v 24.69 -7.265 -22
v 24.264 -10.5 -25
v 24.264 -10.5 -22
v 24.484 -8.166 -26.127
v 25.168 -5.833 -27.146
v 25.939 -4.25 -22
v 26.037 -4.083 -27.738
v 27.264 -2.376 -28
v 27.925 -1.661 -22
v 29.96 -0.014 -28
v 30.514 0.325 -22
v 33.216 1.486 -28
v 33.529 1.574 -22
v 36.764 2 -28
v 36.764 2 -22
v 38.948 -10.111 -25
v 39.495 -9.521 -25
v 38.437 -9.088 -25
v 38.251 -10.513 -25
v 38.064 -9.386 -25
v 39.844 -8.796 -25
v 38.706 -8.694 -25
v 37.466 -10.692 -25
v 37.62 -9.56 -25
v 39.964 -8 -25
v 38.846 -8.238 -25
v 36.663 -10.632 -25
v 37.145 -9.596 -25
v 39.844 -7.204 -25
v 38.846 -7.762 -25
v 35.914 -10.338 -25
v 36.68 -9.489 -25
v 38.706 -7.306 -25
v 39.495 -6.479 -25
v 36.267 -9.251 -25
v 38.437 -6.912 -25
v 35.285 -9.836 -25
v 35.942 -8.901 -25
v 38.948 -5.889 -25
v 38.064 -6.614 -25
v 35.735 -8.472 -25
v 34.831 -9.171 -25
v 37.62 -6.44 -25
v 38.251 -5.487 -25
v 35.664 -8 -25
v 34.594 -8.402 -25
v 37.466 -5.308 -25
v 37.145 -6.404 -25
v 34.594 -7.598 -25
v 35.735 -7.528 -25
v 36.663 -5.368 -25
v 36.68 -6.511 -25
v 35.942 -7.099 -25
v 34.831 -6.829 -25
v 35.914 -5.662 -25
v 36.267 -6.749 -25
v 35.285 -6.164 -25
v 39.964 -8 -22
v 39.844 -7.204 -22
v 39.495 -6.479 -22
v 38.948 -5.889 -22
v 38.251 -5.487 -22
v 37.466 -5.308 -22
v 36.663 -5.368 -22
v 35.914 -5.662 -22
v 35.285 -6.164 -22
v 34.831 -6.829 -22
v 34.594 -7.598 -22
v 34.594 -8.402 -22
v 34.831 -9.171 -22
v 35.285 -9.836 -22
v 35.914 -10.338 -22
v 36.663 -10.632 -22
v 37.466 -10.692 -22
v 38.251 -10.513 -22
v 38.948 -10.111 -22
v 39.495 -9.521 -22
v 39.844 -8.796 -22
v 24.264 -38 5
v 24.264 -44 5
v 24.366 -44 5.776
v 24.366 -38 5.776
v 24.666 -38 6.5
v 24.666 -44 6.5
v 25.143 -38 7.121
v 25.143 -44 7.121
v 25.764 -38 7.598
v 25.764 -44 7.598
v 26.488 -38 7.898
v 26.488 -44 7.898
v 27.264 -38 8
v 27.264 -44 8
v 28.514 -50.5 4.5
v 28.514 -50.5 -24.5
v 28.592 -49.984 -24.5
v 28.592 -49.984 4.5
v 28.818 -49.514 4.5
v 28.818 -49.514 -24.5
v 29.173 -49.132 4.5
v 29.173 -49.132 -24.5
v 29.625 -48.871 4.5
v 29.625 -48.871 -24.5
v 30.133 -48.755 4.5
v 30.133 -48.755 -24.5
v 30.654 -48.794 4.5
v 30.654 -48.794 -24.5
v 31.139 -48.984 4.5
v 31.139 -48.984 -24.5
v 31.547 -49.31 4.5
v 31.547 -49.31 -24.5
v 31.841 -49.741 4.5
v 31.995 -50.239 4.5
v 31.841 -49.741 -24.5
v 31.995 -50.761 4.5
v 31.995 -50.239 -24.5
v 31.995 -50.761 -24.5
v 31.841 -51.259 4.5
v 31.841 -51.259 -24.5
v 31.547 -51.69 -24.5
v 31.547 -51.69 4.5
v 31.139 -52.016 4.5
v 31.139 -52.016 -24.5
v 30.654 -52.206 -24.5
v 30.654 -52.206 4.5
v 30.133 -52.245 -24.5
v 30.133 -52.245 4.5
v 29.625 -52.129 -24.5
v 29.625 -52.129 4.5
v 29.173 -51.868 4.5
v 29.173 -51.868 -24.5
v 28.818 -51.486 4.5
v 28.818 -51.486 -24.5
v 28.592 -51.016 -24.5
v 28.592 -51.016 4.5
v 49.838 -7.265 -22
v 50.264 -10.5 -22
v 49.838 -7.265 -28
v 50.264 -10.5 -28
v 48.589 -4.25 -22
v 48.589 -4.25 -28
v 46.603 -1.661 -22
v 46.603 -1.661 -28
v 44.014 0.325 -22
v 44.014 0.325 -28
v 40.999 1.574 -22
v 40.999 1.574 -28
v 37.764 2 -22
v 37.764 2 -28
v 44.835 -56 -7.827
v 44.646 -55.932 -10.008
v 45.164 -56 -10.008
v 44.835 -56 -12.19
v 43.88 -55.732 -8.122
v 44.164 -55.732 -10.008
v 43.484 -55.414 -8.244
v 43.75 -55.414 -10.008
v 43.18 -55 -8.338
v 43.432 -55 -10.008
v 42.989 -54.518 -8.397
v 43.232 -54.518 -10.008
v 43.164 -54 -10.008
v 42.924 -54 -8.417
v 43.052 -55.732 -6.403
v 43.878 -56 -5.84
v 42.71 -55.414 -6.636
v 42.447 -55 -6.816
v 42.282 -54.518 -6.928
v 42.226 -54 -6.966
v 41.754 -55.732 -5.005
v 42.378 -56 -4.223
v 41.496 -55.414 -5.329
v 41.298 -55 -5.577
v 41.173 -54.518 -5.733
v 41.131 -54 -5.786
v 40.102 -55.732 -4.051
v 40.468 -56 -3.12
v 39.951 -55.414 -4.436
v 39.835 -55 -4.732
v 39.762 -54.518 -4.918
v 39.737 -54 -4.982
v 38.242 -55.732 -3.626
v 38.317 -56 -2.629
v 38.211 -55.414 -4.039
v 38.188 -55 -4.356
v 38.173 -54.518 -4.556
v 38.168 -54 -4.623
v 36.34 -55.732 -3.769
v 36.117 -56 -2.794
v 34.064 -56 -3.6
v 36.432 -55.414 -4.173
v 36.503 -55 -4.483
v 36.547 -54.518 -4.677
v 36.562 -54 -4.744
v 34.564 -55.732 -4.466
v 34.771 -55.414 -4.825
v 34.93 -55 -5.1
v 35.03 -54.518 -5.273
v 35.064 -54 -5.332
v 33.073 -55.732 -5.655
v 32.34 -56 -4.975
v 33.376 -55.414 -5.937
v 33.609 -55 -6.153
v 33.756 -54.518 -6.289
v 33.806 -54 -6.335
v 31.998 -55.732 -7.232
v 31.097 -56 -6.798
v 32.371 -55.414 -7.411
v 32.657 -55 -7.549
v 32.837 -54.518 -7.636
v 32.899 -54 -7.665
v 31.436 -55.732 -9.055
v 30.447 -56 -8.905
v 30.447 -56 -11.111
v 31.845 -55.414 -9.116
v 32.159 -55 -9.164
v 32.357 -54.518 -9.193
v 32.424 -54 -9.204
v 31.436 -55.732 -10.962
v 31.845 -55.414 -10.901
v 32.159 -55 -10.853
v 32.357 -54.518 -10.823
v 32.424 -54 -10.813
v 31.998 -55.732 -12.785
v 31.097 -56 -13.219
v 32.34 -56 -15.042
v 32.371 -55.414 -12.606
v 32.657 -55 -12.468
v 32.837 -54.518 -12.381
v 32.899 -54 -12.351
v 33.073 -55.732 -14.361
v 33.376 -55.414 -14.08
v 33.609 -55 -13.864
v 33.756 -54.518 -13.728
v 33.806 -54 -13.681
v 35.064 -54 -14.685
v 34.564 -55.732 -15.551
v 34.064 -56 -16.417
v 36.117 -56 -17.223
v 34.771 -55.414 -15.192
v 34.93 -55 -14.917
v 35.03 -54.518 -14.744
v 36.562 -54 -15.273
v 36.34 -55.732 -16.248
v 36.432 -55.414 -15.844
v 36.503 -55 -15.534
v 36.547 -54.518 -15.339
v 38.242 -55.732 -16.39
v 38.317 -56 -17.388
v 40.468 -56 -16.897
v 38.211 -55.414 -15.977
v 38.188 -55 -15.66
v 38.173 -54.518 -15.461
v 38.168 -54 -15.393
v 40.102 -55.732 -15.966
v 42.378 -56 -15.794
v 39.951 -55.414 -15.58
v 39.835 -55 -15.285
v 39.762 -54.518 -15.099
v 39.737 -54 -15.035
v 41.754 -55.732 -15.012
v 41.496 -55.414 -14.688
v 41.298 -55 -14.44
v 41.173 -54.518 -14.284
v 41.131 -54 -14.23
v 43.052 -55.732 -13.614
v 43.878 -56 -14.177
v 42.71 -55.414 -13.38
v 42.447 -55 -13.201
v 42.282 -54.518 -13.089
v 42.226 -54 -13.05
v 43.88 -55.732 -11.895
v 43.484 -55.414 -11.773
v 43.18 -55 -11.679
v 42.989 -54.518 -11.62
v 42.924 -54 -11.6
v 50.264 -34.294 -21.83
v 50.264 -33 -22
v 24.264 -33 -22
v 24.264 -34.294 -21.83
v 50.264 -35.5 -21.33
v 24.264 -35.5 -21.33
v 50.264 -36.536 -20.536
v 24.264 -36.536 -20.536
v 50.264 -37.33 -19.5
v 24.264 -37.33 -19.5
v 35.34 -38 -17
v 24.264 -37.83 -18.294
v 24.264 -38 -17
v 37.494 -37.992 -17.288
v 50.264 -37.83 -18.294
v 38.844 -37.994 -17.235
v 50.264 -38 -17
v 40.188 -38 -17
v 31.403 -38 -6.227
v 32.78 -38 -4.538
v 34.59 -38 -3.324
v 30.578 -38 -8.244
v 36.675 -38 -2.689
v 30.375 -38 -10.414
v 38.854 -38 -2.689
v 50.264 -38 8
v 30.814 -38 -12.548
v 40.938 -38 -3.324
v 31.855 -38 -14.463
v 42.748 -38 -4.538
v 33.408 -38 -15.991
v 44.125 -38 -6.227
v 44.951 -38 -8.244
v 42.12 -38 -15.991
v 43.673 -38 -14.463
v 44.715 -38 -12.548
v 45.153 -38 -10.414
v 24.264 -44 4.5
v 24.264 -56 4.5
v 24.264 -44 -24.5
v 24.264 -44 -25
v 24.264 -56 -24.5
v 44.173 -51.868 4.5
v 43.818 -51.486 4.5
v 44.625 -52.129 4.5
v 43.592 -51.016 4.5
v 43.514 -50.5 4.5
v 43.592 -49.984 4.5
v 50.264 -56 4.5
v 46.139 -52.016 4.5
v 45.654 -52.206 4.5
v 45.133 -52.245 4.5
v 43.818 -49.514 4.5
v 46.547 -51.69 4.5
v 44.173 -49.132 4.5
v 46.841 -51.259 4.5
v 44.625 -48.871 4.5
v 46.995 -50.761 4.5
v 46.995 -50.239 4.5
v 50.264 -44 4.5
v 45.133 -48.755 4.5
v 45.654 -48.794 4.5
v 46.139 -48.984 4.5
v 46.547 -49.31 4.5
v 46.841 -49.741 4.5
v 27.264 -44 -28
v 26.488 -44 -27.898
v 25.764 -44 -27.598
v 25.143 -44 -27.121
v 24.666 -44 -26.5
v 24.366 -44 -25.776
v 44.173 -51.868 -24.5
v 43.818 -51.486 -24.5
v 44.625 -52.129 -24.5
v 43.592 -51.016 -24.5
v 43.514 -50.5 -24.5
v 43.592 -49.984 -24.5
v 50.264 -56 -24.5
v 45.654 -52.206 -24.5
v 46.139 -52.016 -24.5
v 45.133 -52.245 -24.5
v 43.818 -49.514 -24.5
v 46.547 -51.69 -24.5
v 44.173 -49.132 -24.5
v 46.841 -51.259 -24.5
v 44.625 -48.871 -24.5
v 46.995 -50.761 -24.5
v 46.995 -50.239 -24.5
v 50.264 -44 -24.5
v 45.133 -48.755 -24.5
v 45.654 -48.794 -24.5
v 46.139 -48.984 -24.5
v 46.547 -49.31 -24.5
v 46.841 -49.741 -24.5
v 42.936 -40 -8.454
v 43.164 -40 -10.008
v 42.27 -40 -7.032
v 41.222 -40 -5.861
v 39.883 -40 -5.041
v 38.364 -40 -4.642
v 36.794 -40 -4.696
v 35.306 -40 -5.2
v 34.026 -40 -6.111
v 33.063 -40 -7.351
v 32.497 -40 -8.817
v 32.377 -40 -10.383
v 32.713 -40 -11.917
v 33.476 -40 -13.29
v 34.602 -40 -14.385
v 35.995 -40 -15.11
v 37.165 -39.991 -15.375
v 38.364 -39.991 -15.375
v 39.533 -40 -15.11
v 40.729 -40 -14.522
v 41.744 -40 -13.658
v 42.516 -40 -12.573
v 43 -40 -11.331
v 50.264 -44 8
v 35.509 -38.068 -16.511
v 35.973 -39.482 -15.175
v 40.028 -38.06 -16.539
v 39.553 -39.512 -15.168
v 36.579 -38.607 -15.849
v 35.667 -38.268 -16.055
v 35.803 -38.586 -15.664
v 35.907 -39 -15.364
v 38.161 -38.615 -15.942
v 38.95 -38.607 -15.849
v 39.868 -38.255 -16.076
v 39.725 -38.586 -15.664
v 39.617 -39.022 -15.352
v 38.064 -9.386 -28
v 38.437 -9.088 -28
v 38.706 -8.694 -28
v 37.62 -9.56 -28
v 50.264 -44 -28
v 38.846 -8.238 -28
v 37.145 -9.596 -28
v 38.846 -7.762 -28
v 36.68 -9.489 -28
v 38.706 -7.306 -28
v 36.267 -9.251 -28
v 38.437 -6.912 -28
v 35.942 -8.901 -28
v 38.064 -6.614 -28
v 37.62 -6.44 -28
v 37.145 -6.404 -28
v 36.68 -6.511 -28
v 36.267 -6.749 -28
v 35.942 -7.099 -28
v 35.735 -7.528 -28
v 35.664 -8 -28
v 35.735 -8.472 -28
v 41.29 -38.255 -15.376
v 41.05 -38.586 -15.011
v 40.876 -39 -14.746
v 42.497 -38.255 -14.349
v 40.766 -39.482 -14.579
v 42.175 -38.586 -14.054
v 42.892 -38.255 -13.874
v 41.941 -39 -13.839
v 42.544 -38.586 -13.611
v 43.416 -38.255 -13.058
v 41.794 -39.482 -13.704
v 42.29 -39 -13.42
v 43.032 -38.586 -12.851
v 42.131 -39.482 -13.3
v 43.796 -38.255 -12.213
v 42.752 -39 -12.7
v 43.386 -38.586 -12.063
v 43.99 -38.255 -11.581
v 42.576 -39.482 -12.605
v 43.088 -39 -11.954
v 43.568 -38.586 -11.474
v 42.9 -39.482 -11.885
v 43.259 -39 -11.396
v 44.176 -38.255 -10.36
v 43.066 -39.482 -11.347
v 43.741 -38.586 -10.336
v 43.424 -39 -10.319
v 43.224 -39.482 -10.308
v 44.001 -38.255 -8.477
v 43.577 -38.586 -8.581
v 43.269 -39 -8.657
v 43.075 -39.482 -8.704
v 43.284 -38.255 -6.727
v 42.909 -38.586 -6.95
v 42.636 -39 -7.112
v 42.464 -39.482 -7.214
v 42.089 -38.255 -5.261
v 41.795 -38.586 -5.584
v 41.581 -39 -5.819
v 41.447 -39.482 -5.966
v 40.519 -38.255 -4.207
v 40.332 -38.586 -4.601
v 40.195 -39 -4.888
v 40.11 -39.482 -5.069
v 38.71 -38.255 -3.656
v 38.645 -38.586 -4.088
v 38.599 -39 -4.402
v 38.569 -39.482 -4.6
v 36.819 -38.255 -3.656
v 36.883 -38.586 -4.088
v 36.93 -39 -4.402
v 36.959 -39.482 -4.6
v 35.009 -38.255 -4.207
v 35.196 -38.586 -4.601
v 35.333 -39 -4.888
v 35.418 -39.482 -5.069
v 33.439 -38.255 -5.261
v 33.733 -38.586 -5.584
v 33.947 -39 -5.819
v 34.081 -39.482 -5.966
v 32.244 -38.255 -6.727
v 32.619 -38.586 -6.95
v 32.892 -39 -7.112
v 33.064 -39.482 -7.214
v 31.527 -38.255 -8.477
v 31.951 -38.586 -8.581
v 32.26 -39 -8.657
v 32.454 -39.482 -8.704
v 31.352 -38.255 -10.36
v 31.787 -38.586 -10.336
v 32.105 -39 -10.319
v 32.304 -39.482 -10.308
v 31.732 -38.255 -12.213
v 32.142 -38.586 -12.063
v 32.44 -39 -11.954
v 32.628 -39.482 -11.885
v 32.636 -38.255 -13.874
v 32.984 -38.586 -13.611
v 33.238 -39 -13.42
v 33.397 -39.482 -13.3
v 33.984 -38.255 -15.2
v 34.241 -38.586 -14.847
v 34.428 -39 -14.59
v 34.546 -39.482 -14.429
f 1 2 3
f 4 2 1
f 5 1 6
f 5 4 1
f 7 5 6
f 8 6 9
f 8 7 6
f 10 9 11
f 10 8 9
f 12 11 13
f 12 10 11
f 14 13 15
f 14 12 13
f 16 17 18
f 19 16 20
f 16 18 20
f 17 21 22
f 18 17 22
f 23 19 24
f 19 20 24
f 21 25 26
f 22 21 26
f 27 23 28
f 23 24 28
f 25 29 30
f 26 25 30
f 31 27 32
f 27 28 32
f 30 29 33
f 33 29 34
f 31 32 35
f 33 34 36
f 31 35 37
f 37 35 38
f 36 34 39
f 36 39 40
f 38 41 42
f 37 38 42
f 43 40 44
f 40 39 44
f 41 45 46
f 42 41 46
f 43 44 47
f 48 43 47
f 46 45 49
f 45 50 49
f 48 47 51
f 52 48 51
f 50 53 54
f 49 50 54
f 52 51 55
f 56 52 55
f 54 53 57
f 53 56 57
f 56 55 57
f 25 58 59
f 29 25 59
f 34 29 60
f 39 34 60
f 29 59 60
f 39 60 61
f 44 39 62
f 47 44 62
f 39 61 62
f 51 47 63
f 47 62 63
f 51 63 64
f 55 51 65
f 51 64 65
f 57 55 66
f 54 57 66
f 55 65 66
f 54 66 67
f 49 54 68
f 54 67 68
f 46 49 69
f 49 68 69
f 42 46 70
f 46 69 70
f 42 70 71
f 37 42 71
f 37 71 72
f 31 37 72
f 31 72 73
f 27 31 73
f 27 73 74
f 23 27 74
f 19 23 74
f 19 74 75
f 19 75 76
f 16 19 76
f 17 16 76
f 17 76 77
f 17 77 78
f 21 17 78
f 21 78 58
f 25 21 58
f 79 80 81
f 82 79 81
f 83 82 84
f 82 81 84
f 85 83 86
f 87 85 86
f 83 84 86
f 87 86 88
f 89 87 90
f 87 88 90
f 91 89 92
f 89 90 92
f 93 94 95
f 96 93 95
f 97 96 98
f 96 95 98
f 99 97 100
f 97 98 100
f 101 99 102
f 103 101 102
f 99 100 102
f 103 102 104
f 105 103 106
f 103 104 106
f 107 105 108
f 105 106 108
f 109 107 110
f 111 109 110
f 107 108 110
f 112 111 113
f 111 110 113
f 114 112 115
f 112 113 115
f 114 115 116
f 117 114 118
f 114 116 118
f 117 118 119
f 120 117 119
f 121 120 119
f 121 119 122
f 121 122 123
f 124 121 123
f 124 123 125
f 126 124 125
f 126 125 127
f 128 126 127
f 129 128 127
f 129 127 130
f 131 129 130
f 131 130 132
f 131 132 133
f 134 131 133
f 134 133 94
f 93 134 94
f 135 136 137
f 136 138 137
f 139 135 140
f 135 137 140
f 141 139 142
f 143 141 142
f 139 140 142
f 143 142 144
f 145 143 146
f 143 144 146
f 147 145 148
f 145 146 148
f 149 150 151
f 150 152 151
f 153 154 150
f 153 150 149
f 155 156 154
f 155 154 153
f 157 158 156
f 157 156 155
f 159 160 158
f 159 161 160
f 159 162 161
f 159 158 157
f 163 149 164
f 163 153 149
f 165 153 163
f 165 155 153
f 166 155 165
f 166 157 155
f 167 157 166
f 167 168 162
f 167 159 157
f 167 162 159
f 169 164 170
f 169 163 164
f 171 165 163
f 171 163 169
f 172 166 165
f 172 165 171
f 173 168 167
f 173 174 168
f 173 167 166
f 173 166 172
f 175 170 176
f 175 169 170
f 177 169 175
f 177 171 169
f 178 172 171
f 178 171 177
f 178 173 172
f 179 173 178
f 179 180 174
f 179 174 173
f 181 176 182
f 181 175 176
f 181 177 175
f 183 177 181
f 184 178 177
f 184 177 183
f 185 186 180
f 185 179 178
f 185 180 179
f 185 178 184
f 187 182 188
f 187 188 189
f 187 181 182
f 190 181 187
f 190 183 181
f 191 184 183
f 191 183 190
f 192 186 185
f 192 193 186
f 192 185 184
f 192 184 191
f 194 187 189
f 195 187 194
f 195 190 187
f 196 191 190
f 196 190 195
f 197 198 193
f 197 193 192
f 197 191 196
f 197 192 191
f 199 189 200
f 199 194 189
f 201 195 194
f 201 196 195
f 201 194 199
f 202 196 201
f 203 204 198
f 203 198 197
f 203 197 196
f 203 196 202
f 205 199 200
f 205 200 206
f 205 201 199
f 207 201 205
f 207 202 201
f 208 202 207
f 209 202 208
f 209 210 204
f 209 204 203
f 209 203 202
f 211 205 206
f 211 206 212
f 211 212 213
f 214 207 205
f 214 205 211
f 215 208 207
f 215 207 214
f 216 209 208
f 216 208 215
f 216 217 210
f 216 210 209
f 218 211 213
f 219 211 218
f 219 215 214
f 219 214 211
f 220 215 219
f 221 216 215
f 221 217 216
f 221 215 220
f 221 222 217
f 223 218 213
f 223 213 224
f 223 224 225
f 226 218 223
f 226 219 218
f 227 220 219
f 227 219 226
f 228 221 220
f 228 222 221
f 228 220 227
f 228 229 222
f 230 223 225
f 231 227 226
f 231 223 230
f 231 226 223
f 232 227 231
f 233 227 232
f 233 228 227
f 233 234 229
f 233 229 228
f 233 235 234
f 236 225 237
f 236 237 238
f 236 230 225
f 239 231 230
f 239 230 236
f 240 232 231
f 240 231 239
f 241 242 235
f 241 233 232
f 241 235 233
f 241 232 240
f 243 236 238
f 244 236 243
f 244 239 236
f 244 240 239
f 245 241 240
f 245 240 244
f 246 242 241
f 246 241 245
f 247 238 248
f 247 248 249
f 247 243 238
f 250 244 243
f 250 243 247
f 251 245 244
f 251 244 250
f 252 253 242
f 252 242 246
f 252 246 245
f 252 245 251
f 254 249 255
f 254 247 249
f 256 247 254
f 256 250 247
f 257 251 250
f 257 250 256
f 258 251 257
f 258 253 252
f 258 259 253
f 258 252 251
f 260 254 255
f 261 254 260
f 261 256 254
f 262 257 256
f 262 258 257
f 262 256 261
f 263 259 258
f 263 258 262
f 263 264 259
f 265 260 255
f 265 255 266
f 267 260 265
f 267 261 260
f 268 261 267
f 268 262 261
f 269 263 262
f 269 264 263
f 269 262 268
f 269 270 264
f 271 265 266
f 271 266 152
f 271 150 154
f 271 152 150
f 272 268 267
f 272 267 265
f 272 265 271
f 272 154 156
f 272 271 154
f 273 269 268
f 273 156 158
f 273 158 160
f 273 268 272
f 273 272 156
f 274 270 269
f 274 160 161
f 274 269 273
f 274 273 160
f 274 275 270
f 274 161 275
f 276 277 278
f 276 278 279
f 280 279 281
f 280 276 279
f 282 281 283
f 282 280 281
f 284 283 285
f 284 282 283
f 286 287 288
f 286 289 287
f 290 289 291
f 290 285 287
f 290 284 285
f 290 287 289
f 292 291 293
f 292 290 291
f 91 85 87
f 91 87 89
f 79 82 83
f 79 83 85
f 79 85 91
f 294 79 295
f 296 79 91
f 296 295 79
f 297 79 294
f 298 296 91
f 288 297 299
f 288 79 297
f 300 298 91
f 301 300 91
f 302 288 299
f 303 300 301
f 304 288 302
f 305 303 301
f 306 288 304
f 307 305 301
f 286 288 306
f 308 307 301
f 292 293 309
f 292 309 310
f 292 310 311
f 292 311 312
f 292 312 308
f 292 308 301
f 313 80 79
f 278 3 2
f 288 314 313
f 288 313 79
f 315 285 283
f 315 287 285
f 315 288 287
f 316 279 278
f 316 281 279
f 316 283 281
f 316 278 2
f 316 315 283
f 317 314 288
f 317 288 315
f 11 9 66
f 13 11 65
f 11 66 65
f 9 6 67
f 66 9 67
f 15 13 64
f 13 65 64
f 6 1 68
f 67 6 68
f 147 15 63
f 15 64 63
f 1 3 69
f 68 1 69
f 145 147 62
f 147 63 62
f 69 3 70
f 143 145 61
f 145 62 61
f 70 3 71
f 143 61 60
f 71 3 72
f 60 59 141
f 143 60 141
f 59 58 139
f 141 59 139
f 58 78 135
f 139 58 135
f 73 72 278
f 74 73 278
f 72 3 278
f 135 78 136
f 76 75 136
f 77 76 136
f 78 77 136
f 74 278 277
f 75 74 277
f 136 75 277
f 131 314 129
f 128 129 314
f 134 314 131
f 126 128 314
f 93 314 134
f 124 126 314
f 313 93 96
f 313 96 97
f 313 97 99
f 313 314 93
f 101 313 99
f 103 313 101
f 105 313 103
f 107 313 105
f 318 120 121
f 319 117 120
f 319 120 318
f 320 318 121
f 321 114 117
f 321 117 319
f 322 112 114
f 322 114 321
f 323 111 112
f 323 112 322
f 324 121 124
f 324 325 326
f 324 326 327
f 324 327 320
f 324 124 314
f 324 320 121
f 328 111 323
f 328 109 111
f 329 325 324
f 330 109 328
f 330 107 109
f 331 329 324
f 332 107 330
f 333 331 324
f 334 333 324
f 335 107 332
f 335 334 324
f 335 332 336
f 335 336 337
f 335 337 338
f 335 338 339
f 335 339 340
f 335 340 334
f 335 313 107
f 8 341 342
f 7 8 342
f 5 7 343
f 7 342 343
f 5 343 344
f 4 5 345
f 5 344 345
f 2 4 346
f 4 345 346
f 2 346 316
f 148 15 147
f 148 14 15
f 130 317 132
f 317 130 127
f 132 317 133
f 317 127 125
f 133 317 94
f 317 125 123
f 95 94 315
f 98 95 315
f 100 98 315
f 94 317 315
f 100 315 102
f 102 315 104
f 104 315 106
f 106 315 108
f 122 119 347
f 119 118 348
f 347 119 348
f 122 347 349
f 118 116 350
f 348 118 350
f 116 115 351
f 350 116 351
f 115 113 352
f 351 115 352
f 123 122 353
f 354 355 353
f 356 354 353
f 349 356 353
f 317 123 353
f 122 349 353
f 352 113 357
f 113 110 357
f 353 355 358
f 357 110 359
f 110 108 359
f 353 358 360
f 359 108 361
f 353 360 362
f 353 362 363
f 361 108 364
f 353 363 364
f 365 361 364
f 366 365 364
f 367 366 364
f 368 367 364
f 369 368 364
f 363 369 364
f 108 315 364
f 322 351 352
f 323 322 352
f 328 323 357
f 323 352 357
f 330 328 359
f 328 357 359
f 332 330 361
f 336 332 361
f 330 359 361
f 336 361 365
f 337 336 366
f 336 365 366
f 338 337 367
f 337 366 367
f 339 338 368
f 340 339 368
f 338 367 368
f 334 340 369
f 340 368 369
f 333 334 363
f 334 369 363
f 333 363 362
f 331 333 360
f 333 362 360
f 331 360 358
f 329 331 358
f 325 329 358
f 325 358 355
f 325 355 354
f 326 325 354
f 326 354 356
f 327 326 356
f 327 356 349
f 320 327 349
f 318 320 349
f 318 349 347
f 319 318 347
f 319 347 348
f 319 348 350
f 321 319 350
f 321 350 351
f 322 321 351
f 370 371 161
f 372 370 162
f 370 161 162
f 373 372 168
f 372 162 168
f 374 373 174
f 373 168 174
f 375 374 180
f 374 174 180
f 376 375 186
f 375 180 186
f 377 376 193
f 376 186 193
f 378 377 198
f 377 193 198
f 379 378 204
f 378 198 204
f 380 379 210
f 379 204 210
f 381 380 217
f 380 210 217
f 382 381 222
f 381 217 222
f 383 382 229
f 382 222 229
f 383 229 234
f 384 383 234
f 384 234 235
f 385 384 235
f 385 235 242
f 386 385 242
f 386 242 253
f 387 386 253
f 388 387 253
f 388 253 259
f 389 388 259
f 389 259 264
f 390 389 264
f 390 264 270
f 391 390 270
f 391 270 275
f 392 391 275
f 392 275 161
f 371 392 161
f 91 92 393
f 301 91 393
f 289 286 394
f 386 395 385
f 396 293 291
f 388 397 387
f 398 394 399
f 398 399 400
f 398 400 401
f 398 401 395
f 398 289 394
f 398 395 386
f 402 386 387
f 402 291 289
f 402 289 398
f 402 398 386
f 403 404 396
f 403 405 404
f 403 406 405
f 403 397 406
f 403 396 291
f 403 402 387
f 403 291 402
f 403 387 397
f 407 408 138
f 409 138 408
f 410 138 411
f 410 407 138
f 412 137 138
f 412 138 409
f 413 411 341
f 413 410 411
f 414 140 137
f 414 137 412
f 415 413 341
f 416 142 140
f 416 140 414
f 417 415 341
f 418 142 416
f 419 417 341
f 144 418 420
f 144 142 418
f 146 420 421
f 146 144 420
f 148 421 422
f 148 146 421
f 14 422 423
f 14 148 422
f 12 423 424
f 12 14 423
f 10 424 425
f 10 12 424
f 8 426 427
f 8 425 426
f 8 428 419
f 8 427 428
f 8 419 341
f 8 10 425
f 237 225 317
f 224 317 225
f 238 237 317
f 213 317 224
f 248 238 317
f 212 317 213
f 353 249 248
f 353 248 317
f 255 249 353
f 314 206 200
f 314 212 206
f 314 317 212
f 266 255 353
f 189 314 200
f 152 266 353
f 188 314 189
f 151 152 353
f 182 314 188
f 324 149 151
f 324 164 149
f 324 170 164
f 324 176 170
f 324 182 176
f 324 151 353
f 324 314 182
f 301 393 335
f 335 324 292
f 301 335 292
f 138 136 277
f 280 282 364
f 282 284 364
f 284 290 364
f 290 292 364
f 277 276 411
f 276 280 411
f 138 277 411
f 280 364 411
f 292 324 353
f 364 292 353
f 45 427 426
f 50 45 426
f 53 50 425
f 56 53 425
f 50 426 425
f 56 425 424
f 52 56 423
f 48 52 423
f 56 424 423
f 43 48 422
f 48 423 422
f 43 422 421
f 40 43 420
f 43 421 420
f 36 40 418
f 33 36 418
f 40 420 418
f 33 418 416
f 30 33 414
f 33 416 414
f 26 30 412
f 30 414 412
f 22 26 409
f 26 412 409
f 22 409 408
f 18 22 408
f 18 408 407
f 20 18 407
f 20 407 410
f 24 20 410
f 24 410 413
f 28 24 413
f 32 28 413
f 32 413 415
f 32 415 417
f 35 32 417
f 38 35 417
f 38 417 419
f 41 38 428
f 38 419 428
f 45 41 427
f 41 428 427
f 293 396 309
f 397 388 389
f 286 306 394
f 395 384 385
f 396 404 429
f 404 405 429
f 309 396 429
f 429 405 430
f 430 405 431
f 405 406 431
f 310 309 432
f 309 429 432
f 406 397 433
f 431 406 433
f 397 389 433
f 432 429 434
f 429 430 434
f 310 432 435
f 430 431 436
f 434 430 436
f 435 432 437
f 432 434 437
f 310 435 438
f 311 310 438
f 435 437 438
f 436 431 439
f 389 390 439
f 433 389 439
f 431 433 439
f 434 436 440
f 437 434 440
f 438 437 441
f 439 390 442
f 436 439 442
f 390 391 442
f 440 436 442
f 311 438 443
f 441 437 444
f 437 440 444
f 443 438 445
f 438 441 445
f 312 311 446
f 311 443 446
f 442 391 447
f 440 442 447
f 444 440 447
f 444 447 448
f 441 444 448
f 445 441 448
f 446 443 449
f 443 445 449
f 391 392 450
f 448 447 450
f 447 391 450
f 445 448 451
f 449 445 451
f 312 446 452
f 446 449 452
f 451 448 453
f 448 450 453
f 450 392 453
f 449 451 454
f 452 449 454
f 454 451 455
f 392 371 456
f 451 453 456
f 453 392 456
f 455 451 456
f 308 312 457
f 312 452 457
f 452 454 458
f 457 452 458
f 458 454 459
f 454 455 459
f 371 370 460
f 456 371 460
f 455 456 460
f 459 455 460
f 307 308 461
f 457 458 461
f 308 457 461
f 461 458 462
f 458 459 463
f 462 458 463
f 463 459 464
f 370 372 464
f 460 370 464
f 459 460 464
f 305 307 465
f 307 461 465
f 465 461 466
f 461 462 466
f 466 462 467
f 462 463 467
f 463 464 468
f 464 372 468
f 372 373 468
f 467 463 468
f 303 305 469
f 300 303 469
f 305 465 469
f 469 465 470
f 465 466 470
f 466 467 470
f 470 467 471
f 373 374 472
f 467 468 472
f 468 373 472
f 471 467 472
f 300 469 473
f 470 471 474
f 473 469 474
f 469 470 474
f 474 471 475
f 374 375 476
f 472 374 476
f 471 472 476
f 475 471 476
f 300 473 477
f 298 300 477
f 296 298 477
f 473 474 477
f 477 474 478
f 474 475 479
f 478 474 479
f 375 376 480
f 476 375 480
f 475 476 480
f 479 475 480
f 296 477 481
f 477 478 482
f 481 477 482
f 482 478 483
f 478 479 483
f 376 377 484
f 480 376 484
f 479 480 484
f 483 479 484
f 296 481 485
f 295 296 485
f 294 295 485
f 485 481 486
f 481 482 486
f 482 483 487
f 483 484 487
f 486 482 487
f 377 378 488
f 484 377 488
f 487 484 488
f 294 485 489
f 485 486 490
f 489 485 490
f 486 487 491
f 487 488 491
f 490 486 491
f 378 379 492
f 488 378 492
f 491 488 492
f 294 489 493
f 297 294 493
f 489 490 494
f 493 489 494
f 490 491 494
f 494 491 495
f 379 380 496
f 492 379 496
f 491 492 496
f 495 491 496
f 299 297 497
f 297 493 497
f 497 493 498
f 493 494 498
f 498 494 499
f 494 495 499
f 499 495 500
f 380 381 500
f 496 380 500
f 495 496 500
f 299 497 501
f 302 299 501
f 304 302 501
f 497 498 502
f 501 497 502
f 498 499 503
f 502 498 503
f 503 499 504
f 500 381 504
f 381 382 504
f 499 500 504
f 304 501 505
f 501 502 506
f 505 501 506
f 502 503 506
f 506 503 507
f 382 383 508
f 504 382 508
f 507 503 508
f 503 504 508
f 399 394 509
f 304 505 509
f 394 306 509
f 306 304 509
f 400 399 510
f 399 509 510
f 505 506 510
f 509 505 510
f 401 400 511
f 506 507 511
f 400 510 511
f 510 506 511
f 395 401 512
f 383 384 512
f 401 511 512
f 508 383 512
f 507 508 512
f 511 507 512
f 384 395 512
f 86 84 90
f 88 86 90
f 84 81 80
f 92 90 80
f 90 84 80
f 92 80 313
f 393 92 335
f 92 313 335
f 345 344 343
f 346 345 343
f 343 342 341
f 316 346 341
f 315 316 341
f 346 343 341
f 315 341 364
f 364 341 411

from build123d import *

# Parameters (mm, degrees)
BOSS_EXTRUDE1_DEPTH = 6
SKETCH2_W           = 26
SKETCH2_H           = 6
BOSS_EXTRUDE2_DEPTH = 40
FILLET1_R           = 12.5
SKETCH3_R           = 2.7
CUT_EXTRUDE1_DEPTH  = 7
SKETCH4_W           = 26
SKETCH4_H           = 29
BOSS_EXTRUDE3_DEPTH = 12
FILLET2_R           = 5
SKETCH5_R           = 1.75
CUT_EXTRUDE2_DEPTH  = 33.5
CUT_EXTRUDE3_DEPTH  = 41
CUT_EXTRUDE4_REACH  = 60
SKETCH7_R           = 5.4
FILLET3_R           = 2
SKETCH8_R           = 2.7
SKETCH8_R_2         = 1.6
BOSS_EXTRUDE4_DEPTH = 3


with BuildPart() as part:
    # Sketch1 → Boss-Extrude1 (new body)
    with BuildSketch(Plane(origin=(0, -44, 0), x_dir=(1, 0, 0), z_dir=(0, 1, 0))):
        with BuildLine():
            Line((50.264100782, -8), (50.264100782, 28))
            Line((50.264100782, 28), (27.264100782, 28))
            ThreePointArc((27.264100782, 28), (25.142780438, 27.121320344), (24.264100782, 25))
            Line((24.264100782, 25), (24.264100782, -5))
            ThreePointArc((24.264100782, -5), (25.142780438, -7.121320344), (27.264100782, -8))
            Line((27.264100782, -8), (50.264100782, -8))
        make_face()
    extrude(amount=BOSS_EXTRUDE1_DEPTH)

    # Sketch2 → Boss-Extrude2 (add)
    with BuildSketch(Plane(origin=(0, -38, 0), x_dir=(1, 0, 0), z_dir=(0, 1, 0))):
        with Locations((37.264100782, 25)):
            Rectangle(SKETCH2_W, SKETCH2_H)
    extrude(amount=BOSS_EXTRUDE2_DEPTH)

    # Fillet1
    fillet1_edges = [part.edges().sort_by_distance(p)[0] for p in [
        (50.264100782, 2, -25),
        (24.264100782, 2, -25),
    ]]
    fillet(fillet1_edges, radius=FILLET1_R)

    # Sketch3 → Cut-Extrude1 (cut, through all)
    with BuildSketch(Plane.XY.offset(-22)):
        with Locations((37.264100782, -8)):
            Circle(SKETCH3_R)
    extrude(amount=-CUT_EXTRUDE1_DEPTH, mode=Mode.SUBTRACT)

    # Sketch4 → Boss-Extrude3 (add)
    with BuildSketch(Plane.XZ.offset(44)):
        with Locations((37.264100782, -10)):
            Rectangle(SKETCH4_W, SKETCH4_H)
    extrude(amount=BOSS_EXTRUDE3_DEPTH)

    # Fillet2
    fillet2_edges = [part.edges().sort_by_distance(p)[0] for p in [
        (37.264100782, -38, -22),
    ]]
    fillet(fillet2_edges, radius=FILLET2_R)

    # Sketch5 → Cut-Extrude2 (cut, through all)
    with BuildSketch(Plane(origin=(0, 0, -24.5), x_dir=(-1, 0, 0), z_dir=(0, 0, -1))):
        with Locations((-45.264100782, -50.5)):
            Circle(SKETCH5_R)
        with Locations((-30.264100782, -50.5)):
            Circle(SKETCH5_R)
    extrude(amount=-CUT_EXTRUDE2_DEPTH, mode=Mode.SUBTRACT)

    # Sketch6 → Cut-Extrude3 (cut, through all)
    with BuildSketch(Plane.XZ.offset(38)):
        with BuildLine():
            Line((24.264100782, -28), (27.264100782, -28))
            ThreePointArc((27.264100782, -28), (25.142780438, -27.121320344), (24.264100782, -25))
            Line((24.264100782, -25), (24.264100782, -28))
        make_face()
    extrude(amount=-CUT_EXTRUDE3_DEPTH, mode=Mode.SUBTRACT)

    # Sketch7 → Cut-Extrude4 (cut, up to next)
    with BuildSketch(Plane.XZ.offset(56), mode=Mode.PRIVATE) as cut_extrude4_sk1:
        with Locations((37.764100782, -10.008379986)):
            Circle(SKETCH7_R)
    cut_extrude4_tool1 = extrude(cut_extrude4_sk1.sketch, amount=-CUT_EXTRUDE4_REACH, mode=Mode.PRIVATE) & part.part
    add(cut_extrude4_tool1.solids().sort_by_distance((37.764101, -56, -10.00838))[0], mode=Mode.SUBTRACT)

    # Fillet3
    fillet3_edges = [part.edges().sort_by_distance(p)[0] for p in [
        (32.364100782, -38, -10.008379986),
        (32.364100782, -56, -10.008379986),
    ]]
    fillet(fillet3_edges, radius=FILLET3_R)

    # Sketch8 → Boss-Extrude4 (add)
    with BuildSketch(Plane(origin=(0, 0, -28), x_dir=(-1, 0, 0), z_dir=(0, 0, -1))):
        with Locations((-37.264100782, -8)):
            Circle(SKETCH8_R)
        with Locations((-37.264100782, -8)):
            Circle(SKETCH8_R_2, mode=Mode.SUBTRACT)
    extrude(amount=-BOSS_EXTRUDE4_DEPTH)


solid = part.part
